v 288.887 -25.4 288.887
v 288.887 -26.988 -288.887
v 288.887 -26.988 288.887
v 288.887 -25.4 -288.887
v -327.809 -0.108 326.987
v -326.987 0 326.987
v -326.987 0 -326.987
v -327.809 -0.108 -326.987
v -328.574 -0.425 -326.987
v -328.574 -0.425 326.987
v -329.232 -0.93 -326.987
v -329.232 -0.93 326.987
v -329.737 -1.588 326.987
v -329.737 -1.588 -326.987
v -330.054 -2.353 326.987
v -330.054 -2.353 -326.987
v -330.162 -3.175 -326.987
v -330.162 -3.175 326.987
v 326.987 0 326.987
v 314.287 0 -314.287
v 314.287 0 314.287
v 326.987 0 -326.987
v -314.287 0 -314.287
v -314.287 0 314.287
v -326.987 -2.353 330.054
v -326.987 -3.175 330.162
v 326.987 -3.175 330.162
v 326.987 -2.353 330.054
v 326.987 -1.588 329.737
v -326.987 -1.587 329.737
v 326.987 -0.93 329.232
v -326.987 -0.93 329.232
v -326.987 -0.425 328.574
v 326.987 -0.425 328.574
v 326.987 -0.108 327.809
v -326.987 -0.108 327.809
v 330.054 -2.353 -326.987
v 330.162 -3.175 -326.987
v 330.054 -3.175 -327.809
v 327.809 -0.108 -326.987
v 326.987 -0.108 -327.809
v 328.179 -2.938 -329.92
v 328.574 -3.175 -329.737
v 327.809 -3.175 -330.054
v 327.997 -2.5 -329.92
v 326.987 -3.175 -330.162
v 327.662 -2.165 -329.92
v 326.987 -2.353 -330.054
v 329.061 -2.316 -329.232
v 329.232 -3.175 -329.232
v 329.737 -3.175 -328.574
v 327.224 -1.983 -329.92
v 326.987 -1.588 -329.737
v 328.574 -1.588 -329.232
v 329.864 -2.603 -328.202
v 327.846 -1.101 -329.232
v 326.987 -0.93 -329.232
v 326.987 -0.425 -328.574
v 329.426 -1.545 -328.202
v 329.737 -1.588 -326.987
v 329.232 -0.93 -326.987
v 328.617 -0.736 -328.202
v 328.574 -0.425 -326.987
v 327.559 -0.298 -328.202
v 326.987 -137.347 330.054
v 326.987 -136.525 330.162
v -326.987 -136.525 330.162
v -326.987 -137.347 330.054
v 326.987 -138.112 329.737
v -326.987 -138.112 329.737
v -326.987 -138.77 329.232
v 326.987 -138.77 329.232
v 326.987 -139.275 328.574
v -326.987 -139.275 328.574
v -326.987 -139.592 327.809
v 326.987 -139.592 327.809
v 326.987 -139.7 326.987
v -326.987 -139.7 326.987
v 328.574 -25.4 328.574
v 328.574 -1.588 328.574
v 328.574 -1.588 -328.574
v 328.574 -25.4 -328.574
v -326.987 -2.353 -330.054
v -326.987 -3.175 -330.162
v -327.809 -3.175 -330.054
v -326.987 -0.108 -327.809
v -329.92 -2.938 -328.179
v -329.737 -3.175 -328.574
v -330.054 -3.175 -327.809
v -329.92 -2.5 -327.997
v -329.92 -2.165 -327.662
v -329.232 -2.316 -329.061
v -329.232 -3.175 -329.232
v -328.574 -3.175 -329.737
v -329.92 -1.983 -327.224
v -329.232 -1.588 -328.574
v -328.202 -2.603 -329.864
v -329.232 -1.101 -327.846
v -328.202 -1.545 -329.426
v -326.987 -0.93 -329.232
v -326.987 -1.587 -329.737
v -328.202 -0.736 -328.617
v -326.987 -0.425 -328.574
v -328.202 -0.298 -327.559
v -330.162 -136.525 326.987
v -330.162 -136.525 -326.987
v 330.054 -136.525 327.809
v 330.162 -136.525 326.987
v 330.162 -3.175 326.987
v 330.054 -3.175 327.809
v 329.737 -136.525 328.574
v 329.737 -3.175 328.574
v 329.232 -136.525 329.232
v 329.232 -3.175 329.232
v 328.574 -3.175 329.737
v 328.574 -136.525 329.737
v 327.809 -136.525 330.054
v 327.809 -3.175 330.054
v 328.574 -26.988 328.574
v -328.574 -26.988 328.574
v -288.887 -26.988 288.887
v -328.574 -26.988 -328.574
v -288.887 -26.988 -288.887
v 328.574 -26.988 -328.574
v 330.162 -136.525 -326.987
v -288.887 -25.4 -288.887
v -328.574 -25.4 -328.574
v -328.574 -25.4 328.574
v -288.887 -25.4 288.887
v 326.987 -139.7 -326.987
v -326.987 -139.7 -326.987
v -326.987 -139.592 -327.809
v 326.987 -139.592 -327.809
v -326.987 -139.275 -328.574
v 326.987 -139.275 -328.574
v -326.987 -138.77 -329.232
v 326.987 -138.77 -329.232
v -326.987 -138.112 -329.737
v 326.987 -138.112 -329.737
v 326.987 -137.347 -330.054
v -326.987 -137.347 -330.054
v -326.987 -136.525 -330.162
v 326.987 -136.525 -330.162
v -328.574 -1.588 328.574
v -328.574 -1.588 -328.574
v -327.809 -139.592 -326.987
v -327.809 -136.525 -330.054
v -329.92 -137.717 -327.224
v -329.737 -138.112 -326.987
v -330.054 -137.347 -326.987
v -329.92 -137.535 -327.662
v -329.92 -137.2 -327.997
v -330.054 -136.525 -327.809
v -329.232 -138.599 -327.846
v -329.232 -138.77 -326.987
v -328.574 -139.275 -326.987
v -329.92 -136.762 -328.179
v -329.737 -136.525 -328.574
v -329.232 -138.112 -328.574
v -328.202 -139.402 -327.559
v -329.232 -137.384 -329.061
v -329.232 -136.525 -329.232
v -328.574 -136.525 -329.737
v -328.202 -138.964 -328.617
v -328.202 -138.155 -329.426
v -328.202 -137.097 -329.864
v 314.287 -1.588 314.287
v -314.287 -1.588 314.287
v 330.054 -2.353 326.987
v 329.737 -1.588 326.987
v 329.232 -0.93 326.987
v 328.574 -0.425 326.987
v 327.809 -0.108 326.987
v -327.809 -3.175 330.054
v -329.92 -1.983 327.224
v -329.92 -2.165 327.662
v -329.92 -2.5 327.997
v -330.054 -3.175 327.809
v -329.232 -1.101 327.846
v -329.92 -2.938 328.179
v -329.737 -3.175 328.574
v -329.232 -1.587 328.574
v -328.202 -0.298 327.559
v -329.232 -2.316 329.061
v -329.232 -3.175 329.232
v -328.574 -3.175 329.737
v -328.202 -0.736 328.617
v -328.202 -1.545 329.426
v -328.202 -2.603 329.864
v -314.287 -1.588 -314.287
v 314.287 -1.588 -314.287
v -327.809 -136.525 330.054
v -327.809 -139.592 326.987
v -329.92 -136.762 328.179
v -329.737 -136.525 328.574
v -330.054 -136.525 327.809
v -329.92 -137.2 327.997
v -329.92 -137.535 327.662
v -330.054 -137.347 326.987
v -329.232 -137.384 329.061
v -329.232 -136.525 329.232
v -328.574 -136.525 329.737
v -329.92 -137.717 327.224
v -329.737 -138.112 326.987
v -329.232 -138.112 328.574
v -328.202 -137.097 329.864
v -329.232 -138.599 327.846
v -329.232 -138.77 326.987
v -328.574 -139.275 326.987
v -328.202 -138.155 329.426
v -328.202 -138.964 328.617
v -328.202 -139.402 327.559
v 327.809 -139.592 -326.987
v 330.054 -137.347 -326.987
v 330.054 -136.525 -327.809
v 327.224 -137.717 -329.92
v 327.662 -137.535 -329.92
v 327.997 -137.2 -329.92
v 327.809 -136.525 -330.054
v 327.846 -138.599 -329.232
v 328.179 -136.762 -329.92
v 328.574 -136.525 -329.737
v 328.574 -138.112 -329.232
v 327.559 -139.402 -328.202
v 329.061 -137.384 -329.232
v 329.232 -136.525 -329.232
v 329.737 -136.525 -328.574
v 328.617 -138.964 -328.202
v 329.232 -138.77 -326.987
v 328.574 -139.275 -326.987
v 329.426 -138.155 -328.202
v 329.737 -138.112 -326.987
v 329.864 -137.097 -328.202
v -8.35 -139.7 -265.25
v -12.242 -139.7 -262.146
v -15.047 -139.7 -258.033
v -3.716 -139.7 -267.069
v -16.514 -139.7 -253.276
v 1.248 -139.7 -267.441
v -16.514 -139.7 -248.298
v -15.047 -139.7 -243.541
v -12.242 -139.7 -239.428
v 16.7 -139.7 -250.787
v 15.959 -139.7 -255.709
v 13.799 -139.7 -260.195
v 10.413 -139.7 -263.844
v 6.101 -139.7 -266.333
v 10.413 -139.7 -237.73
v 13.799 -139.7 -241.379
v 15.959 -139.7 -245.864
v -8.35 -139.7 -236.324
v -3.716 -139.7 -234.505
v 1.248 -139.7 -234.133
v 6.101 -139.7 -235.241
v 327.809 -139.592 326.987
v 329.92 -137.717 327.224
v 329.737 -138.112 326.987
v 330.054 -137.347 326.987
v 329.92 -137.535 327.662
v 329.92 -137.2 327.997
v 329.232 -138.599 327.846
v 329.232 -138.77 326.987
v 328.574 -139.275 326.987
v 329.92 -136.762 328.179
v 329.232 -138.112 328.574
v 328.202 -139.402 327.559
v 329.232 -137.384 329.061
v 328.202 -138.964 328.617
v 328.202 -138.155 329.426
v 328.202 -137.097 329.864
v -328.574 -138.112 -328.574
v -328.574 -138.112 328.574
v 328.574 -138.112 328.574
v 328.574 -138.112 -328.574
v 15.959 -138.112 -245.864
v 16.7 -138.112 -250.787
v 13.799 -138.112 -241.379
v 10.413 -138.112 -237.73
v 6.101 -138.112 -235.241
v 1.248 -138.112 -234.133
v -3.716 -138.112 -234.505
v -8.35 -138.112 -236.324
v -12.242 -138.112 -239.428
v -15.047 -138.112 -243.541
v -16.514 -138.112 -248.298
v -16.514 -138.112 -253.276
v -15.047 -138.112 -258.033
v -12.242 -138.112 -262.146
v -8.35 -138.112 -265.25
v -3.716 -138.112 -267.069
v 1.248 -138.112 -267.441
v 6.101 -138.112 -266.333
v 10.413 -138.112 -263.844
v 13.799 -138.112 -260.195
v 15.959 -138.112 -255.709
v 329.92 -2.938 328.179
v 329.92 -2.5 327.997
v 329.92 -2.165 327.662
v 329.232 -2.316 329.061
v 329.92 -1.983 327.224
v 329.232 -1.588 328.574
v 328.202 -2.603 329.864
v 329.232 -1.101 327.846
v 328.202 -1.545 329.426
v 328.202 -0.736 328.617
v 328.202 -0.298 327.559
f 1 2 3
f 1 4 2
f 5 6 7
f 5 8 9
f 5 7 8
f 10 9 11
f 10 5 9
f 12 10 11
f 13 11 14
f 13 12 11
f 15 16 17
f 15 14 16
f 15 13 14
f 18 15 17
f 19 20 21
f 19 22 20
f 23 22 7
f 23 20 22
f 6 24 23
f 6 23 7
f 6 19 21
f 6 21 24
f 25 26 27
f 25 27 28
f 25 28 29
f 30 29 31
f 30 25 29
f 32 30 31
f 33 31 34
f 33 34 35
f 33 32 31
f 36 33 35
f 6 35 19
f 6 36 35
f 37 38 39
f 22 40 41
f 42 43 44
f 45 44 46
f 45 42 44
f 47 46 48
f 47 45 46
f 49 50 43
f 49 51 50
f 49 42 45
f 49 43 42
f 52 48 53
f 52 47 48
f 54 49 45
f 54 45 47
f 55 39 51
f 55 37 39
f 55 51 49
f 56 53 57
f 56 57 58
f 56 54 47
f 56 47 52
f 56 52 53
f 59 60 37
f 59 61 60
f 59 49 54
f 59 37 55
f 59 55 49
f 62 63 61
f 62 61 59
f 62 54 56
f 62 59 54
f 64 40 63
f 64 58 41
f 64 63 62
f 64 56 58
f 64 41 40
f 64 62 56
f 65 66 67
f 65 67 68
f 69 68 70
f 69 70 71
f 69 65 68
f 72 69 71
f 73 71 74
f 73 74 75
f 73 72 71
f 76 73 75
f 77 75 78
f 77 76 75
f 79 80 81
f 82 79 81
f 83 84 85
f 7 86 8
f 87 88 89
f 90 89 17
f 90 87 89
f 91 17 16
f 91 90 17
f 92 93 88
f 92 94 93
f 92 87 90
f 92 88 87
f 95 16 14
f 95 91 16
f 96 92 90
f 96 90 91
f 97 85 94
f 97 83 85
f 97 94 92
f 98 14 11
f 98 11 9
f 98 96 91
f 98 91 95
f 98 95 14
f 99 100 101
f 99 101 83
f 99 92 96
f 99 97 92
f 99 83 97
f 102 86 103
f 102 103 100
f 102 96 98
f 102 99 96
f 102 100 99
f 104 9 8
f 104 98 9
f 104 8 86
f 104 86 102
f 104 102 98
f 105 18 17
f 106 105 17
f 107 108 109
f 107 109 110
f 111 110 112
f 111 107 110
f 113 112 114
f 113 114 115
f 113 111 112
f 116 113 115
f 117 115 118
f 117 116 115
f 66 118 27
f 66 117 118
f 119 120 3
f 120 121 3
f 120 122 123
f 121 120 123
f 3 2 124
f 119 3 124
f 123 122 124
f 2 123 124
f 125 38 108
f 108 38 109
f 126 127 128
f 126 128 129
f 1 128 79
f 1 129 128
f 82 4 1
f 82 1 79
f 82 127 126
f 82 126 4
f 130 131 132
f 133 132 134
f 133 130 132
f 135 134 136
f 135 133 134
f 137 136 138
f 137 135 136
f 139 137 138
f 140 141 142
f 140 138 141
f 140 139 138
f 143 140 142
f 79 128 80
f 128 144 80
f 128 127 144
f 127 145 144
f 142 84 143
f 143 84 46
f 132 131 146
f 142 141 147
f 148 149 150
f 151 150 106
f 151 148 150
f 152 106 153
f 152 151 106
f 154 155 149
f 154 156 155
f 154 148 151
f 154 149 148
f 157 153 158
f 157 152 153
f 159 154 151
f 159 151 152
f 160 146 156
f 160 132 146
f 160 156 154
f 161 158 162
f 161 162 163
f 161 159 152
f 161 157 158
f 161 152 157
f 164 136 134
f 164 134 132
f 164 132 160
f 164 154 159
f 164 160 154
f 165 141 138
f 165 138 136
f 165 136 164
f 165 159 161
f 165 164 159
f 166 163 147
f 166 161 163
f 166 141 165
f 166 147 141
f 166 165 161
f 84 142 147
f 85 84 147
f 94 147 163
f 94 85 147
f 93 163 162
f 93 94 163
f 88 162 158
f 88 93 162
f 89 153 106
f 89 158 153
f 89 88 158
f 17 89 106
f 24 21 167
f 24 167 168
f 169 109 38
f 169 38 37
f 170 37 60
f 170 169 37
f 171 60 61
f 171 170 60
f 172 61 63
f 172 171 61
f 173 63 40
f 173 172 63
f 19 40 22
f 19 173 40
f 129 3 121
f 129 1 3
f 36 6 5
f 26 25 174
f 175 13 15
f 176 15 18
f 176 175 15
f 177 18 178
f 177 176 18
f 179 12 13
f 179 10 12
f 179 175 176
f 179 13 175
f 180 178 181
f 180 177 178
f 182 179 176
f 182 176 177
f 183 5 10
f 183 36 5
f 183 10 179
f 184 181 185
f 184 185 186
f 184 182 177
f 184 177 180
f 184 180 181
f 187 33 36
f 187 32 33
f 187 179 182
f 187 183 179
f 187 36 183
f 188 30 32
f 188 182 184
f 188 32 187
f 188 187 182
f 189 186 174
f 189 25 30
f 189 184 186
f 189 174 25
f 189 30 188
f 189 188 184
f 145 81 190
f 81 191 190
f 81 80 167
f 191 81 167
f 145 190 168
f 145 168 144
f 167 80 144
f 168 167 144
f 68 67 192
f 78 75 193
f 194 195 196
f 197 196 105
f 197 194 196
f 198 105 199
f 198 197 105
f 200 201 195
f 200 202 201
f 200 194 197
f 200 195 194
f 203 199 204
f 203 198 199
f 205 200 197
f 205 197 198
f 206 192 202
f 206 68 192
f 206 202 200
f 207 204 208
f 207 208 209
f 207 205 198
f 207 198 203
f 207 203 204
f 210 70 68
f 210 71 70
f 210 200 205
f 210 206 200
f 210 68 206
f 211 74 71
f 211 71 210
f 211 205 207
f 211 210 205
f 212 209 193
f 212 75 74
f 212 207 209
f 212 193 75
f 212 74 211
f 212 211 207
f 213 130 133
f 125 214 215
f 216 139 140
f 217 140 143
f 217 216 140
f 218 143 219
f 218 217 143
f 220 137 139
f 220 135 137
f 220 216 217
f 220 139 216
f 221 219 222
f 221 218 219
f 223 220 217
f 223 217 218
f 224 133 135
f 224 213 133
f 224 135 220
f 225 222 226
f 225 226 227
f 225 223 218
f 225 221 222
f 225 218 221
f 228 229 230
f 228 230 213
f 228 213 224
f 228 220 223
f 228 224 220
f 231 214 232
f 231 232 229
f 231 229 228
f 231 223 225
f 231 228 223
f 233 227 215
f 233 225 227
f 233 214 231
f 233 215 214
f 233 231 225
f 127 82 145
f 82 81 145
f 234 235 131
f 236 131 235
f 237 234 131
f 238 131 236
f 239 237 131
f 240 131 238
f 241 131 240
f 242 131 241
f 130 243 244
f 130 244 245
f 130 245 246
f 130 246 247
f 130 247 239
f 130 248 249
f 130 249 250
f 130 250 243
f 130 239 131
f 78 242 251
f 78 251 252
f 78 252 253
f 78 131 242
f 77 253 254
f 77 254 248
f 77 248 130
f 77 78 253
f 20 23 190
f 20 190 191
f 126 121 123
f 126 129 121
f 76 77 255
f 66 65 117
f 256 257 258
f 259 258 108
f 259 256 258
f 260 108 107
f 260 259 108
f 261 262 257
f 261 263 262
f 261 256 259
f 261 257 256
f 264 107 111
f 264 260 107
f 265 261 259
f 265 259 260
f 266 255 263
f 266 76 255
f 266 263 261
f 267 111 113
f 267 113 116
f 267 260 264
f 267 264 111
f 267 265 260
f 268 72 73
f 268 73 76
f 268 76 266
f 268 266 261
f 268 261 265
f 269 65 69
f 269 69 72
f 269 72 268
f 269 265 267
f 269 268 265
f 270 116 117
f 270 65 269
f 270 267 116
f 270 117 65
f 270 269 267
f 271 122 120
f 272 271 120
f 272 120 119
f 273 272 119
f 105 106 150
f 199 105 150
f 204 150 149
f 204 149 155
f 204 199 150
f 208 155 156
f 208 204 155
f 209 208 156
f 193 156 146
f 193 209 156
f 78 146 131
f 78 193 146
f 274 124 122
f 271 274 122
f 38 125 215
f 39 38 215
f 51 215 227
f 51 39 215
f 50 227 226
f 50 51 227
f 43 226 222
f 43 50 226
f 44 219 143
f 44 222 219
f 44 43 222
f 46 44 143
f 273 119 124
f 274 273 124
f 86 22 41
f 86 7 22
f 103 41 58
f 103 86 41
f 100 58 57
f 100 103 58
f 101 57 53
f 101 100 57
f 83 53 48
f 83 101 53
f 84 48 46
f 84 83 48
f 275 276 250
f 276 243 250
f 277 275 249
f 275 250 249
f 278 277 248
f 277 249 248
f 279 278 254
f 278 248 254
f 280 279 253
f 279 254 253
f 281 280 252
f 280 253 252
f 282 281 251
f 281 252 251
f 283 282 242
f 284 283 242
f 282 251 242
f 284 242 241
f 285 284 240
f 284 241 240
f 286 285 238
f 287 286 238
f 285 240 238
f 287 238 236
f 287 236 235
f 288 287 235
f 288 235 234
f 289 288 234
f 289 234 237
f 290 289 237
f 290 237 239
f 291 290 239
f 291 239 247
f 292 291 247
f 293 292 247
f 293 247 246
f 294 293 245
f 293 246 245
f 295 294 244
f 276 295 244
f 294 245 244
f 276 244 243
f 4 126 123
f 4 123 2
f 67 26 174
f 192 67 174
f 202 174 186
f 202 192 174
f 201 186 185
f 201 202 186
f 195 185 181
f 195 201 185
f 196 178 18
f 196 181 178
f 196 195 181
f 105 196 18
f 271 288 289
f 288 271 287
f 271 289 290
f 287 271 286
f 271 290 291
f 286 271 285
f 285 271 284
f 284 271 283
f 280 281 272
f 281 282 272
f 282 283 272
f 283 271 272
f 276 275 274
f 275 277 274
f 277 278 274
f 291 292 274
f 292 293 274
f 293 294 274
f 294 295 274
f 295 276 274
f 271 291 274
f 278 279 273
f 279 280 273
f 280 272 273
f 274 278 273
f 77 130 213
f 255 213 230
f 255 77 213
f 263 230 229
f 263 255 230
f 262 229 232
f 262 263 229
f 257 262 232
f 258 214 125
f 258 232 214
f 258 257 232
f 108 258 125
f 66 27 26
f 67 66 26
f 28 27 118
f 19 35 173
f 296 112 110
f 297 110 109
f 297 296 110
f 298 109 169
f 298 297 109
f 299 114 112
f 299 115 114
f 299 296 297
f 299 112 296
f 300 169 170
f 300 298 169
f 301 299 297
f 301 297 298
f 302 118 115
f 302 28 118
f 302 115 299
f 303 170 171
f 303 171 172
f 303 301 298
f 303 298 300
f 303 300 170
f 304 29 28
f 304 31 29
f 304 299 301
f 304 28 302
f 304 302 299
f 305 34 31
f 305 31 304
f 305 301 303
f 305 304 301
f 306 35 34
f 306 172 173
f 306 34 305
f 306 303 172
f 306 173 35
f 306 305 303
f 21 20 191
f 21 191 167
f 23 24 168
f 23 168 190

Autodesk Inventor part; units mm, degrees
ref_plane "YZ Plane" through (0, 0, 0) normal (1, 0, 0) x (0, 1, 0)
ref_plane "XZ Plane" through (0, 0, 0) normal (0, 1, 0) x (-1, 0, 0)
sketch "Sketch1" plane through (0, 0, 0) normal (0, 1, 0) x (-1, 0, 0)
  line L0 (-462.2267, 0) -> (462.2267, 0) projected
  line L1 (0, -462.2267) -> (0, 462.2267) projected
  line L2 (-330.1619, 330.1619) -> (330.1619, 330.1619)
  line L3 (330.1619, 330.1619) -> (330.1619, -330.1619)
  line L4 (330.1619, -330.1619) -> (-330.1619, -330.1619)
  line L5 (-330.1619, -330.1619) -> (-330.1619, 330.1619)
  line L6 (462.2267, 0) -> (-462.2267, 0) projected
  line L7 (0, -462.2267) -> (0, 462.2267) projected
  line L8 (314.2869, -314.2869) -> (-314.2869, -314.2869)
  line L9 (-314.2869, -314.2869) -> (-314.2869, 314.2869)
  line L10 (-314.2869, 314.2869) -> (314.2869, 314.2869)
  line L11 (314.2869, 314.2869) -> (314.2869, -314.2869)
  point P0 (0, 0)
  dimension "d0" = 660.3238
  dimension "d2" = 660.3238
  dimension "d123" = 15.875
  dimension "d124" = 15.875
extrude "Extrusion1" add sketch "Sketch1" against normal blind 1.5875 contours L5 L2 L1 L10 L9 L0 | L0 L9 L8 L1 L4 L5 | L1 L8 L11 L0 L3 L4 | L2 L3 L0 L11 L10 L1
sketch "Sketch2" plane through (0, -1.5875, 0) normal (0, -1, 0) x (1, 0, 0)
  line L0 (330.1619, 330.1619) -> (-330.1619, 330.1619) projected
  line L1 (-330.1619, 330.1619) -> (-330.1619, -330.1619) projected
  line L2 (-330.1619, -330.1619) -> (330.1619, -330.1619) projected
  line L3 (330.1619, -330.1619) -> (330.1619, 330.1619) projected
  line L4 (-314.2869, -314.2869) -> (-314.2869, 314.2869) projected
  line L5 (-314.2869, 314.2869) -> (314.2869, 314.2869) projected
  line L6 (314.2869, 314.2869) -> (314.2869, -314.2869) projected
  line L7 (314.2869, -314.2869) -> (-314.2869, -314.2869) projected
  line L8 (330.1619, 330.1619) -> (-330.1619, 330.1619) projected
  line L9 (-330.1619, 330.1619) -> (-330.1619, -330.1619) projected
  line L10 (-330.1619, -330.1619) -> (330.1619, -330.1619) projected
  line L11 (330.1619, -330.1619) -> (330.1619, 330.1619) projected
  line L12 (0, -462.2267) -> (0, 462.2267) projected
  line L13 (-462.2267, 0) -> (462.2267, 0) projected
  line L14 (-328.5744, 328.5744) -> (328.5744, 328.5744)
  line L15 (328.5744, 328.5744) -> (328.5744, -328.5744)
  line L16 (328.5744, -328.5744) -> (-328.5744, -328.5744)
  line L17 (-328.5744, -328.5744) -> (-328.5744, 328.5744)
  point P0 (0, 0)
  dimension "d7" = 1.5875
  dimension "d8" = 1.5875
extrude "Extrusion2" add sketch "Sketch2" along normal blind 136.525 contours L3 L13 L15 L14 L12 L0 | L12 L14 L17 L13 L1 L0 | L3 L2 L12 L16 L15 L13 | L13 L17 L16 L12 L2 L1
sketch "Sketch3" plane through (0, -138.1125, 0) normal (0, -1, 0) x (1, 0, 0)
  line L0 (-462.2267, 0) -> (462.2267, 0) projected
  line L1 (0, -462.2267) -> (0, 462.2267) projected
  line L2 (-330.1619, 330.1619) -> (330.1619, 330.1619)
  line L3 (330.1619, 330.1619) -> (330.1619, -330.1619)
  line L4 (330.1619, -330.1619) -> (-330.1619, -330.1619)
  line L5 (-330.1619, -330.1619) -> (-330.1619, 330.1619)
  point P0 (0, 0)
extrude "Extrusion3" add sketch "Sketch3" along normal blind 1.5875
ref_plane "Work Plane1" through (0, -25.4, 0) normal (0, 1, 0) x (1, 0, 0)
sketch "Sketch4" plane through (0, -25.4, 0) normal (0, 1, 0) x (1, 0, 0)
  line L0 (328.5744, -328.5744) -> (328.5744, 328.5744) projected
  line L1 (328.5744, 328.5744) -> (-328.5744, 328.5744) projected
  line L2 (-328.5744, 328.5744) -> (-328.5744, -328.5744) projected
  line L3 (-328.5744, -328.5744) -> (328.5744, -328.5744) projected
  line L4 (-330.1619, -330.1619) -> (-330.1619, 330.1619) projected
  line L5 (-330.1619, 330.1619) -> (330.1619, 330.1619) projected
  line L6 (330.1619, 330.1619) -> (330.1619, -330.1619) projected
  line L7 (330.1619, -330.1619) -> (-330.1619, -330.1619) projected
  line L8 (-288.8869, 288.8869) -> (288.8869, 288.8869)
  line L9 (288.8869, 288.8869) -> (288.8869, -288.8869)
  line L10 (288.8869, -288.8869) -> (-288.8869, -288.8869)
  line L11 (-288.8869, -288.8869) -> (-288.8869, 288.8869)
  line L12 (462.2267, 0) -> (-462.2267, 0) projected
  line L13 (0, 462.2267) -> (0, -462.2267) projected
  point P0 (0, 0)
  dimension "d121" = 41.275
  dimension "d122" = 41.275
extrude "Extrusion4" add sketch "Sketch4" against normal blind 1.5875 contours L3 L13 L10 L9 L12 L0 | L12 L9 L8 L13 L1 L0 | L3 L2 L12 L11 L10 L13 | L13 L8 L11 L12 L2 L1
fillet "Fillet1" radius 3.175 12 edges at (0, 0, 330.1619) (0, -139.7, 330.1619) (330.1619, -69.85, 330.1619) (330.1619, -139.7, 0) (330.1619, 0, 0) (330.1619, -69.85, -330.1619) (0, 0, -330.1619) (-330.1619, 0, 0) (-330.1619, -69.85, 330.1619) (0, -139.7, -330.1619) (-330.1619, -69.85, -330.1619) (-330.1619, -139.7, 0)
sketch "Sketch11" plane through (0, -139.7, 0) normal (0, -1, 0) x (1, 0, 0)
  line L0 (326.9869, -326.9869) -> (-326.9869, -326.9869) projected
  line L1 (0, 462.2267) -> (0, -462.2267) projected
  circle A0 centre (0, -250.7869) radius 16.7005
  point P0 (0, 0)
  dimension "d130" = 33.401
  dimension "d131" = 76.2
  dimension "d74" = 57.15
  dimension "d75" = 33.401
extrude "Extrusion12" cut sketch "Sketch11" against normal up to next
sketch "Sketch6" plane through (-328.5744, -138.1125, -328.5744) normal (0, 0, 1) x (1, 0, 0)
  circle A0 centre (298.4119, 42.8625) radius 15.875 projected
  circle A1 centre (298.4119, 42.8625) radius 15.875
  circle A2 centre (298.4119, 42.8625) radius 12.7
  point P0 (328.5744, 138.1125)
  dimension "d83" = 25.4
sketch "Sketch7" plane through (330.1619, -136.525, 326.9869) normal (1, 0, 0) x (0, 0, -1)
  line L0 (653.9738, 136.525) -> (0, 136.525) projected
  line L1 (326.9869, -34.925) -> (326.9869, 187.325) projected
  circle A0 centre (55.5752, 152.4) radius 3.175
  line L2 (-1.5875, 134.9375) -> (-1.5875, 111.125) projected
  line L3 (-3.175, 133.35) -> (-3.175, 0) projected
  circle A1 centre (598.3986, 152.4) radius 3.175
  point P0 (326.9869, 136.525)
  dimension "d91" = 6.35
  dimension "d95" = 58.7502
  dimension "d96" = 15.875
properties part number "Propane Burner Base" material "Steel"
